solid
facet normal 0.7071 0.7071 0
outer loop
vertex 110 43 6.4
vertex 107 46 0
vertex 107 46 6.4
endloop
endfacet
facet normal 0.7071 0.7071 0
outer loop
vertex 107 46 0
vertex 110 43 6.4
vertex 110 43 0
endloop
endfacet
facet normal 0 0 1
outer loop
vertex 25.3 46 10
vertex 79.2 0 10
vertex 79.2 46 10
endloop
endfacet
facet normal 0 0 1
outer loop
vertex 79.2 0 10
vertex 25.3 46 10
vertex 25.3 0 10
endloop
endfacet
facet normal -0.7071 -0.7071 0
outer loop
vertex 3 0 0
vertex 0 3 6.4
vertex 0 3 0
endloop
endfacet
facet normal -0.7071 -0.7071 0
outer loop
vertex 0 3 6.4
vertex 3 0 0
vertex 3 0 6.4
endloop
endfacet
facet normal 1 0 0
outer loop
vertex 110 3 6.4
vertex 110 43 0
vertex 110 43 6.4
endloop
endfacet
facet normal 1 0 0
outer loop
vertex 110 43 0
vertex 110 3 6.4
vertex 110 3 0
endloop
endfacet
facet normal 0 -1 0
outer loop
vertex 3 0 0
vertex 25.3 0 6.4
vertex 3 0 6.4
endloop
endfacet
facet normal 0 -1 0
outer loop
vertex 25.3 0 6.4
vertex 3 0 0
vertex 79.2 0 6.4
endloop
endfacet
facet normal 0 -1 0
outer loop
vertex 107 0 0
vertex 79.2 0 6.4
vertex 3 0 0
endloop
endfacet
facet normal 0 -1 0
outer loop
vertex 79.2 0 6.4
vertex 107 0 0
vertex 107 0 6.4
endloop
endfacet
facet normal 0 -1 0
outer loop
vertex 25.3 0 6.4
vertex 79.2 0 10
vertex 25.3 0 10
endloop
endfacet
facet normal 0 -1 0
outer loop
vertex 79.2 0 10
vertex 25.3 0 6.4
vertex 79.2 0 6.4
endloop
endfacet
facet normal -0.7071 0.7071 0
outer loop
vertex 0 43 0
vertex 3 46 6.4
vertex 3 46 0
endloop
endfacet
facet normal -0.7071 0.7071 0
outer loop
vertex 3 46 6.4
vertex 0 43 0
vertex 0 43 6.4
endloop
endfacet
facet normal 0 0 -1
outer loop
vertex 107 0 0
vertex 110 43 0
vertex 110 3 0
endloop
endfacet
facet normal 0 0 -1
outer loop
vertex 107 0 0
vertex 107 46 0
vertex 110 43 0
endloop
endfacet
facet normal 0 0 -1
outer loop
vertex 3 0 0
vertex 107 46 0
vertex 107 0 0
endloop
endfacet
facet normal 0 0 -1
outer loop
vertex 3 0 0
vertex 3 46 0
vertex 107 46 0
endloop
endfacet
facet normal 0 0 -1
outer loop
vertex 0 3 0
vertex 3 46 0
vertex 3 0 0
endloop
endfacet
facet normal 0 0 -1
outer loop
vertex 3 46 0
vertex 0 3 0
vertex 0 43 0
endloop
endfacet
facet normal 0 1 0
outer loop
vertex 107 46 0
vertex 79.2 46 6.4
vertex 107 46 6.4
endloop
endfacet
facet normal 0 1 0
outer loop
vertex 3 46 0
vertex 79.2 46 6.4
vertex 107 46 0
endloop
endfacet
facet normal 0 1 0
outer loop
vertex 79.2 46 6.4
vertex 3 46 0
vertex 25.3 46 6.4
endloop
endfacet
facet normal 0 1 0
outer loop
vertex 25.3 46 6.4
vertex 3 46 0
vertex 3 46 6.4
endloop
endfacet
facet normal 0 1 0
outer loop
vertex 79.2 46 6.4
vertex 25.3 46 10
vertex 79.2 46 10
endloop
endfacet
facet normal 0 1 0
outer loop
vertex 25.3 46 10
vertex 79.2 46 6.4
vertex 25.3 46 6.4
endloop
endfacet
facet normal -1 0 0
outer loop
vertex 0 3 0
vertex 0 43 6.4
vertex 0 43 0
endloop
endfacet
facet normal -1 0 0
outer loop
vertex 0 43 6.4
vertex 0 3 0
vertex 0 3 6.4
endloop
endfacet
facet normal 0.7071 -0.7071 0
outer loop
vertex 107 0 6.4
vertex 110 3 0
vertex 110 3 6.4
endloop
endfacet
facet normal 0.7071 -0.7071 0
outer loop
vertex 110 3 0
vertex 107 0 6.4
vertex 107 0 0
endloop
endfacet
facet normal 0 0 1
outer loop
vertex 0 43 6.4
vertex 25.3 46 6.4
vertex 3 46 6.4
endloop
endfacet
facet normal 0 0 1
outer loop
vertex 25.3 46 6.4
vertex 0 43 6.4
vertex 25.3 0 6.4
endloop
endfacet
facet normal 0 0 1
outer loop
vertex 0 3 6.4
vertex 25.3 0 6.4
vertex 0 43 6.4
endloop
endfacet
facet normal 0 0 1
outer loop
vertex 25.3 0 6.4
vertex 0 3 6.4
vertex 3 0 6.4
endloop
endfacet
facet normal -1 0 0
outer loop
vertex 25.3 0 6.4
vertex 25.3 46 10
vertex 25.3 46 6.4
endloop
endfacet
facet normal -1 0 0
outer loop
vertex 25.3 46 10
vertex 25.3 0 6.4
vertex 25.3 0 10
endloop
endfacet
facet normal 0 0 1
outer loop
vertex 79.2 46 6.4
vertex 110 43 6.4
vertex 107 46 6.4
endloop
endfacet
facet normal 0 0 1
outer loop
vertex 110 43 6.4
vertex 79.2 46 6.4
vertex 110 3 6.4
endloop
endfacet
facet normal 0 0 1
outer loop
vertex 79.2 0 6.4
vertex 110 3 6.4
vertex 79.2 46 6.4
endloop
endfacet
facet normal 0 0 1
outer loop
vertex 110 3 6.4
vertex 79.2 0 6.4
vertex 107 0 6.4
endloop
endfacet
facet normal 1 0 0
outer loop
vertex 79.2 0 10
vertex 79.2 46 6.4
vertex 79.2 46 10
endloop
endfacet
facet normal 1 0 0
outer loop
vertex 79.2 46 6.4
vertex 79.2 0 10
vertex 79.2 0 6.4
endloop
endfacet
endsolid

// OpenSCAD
$fn = 32;

// ----------------------------------------------------------------------
// Stepped bar: centerstep, 110 x 46 x 10/6.4 mm
// ----------------------------------------------------------------------

// --- parameters (mm) ---
bar_l = 110;              // bar length, X
bar_w = 46;               // bar width, Y
plate_t = 10;             // thickness of the thick zone, Z
thin_t = 6.4;             // thickness of the thin zone
corner_c = 3;             // corner chamfer of the bar
step_cut = 3.6;           // material removed from the thin zone
thick_from = 25.3;        // start of the thick middle zone
thick_to = 79.2;          // end of the thick middle zone
depth_1 = 3.6;            // depth of cut 1 from the top face
depth_2 = 3.6;            // depth of cut 2 from the top face

profile = [[3, 0], [107, 0], [110, 3], [110, 43], [107, 46], [3, 46], [0, 43], [0, 3]];  // primary outline, 8 points, counter clockwise
void_1 = [[-1, -1], [25.3, -1], [25.3, 47], [-1, 47]];  // thin left end, 4 points
void_2 = [[79.2, -1], [111, -1], [111, 47], [79.2, 47]];  // thin right end, 4 points

// --- the one profile operation ---
difference() {
  linear_extrude(height = plate_t) polygon(points = profile);
  translate([0, 0, plate_t - depth_1])
    linear_extrude(height = depth_1 + 1) polygon(points = void_1);
  translate([0, 0, plate_t - depth_2])
    linear_extrude(height = depth_2 + 1) polygon(points = void_2);
}
